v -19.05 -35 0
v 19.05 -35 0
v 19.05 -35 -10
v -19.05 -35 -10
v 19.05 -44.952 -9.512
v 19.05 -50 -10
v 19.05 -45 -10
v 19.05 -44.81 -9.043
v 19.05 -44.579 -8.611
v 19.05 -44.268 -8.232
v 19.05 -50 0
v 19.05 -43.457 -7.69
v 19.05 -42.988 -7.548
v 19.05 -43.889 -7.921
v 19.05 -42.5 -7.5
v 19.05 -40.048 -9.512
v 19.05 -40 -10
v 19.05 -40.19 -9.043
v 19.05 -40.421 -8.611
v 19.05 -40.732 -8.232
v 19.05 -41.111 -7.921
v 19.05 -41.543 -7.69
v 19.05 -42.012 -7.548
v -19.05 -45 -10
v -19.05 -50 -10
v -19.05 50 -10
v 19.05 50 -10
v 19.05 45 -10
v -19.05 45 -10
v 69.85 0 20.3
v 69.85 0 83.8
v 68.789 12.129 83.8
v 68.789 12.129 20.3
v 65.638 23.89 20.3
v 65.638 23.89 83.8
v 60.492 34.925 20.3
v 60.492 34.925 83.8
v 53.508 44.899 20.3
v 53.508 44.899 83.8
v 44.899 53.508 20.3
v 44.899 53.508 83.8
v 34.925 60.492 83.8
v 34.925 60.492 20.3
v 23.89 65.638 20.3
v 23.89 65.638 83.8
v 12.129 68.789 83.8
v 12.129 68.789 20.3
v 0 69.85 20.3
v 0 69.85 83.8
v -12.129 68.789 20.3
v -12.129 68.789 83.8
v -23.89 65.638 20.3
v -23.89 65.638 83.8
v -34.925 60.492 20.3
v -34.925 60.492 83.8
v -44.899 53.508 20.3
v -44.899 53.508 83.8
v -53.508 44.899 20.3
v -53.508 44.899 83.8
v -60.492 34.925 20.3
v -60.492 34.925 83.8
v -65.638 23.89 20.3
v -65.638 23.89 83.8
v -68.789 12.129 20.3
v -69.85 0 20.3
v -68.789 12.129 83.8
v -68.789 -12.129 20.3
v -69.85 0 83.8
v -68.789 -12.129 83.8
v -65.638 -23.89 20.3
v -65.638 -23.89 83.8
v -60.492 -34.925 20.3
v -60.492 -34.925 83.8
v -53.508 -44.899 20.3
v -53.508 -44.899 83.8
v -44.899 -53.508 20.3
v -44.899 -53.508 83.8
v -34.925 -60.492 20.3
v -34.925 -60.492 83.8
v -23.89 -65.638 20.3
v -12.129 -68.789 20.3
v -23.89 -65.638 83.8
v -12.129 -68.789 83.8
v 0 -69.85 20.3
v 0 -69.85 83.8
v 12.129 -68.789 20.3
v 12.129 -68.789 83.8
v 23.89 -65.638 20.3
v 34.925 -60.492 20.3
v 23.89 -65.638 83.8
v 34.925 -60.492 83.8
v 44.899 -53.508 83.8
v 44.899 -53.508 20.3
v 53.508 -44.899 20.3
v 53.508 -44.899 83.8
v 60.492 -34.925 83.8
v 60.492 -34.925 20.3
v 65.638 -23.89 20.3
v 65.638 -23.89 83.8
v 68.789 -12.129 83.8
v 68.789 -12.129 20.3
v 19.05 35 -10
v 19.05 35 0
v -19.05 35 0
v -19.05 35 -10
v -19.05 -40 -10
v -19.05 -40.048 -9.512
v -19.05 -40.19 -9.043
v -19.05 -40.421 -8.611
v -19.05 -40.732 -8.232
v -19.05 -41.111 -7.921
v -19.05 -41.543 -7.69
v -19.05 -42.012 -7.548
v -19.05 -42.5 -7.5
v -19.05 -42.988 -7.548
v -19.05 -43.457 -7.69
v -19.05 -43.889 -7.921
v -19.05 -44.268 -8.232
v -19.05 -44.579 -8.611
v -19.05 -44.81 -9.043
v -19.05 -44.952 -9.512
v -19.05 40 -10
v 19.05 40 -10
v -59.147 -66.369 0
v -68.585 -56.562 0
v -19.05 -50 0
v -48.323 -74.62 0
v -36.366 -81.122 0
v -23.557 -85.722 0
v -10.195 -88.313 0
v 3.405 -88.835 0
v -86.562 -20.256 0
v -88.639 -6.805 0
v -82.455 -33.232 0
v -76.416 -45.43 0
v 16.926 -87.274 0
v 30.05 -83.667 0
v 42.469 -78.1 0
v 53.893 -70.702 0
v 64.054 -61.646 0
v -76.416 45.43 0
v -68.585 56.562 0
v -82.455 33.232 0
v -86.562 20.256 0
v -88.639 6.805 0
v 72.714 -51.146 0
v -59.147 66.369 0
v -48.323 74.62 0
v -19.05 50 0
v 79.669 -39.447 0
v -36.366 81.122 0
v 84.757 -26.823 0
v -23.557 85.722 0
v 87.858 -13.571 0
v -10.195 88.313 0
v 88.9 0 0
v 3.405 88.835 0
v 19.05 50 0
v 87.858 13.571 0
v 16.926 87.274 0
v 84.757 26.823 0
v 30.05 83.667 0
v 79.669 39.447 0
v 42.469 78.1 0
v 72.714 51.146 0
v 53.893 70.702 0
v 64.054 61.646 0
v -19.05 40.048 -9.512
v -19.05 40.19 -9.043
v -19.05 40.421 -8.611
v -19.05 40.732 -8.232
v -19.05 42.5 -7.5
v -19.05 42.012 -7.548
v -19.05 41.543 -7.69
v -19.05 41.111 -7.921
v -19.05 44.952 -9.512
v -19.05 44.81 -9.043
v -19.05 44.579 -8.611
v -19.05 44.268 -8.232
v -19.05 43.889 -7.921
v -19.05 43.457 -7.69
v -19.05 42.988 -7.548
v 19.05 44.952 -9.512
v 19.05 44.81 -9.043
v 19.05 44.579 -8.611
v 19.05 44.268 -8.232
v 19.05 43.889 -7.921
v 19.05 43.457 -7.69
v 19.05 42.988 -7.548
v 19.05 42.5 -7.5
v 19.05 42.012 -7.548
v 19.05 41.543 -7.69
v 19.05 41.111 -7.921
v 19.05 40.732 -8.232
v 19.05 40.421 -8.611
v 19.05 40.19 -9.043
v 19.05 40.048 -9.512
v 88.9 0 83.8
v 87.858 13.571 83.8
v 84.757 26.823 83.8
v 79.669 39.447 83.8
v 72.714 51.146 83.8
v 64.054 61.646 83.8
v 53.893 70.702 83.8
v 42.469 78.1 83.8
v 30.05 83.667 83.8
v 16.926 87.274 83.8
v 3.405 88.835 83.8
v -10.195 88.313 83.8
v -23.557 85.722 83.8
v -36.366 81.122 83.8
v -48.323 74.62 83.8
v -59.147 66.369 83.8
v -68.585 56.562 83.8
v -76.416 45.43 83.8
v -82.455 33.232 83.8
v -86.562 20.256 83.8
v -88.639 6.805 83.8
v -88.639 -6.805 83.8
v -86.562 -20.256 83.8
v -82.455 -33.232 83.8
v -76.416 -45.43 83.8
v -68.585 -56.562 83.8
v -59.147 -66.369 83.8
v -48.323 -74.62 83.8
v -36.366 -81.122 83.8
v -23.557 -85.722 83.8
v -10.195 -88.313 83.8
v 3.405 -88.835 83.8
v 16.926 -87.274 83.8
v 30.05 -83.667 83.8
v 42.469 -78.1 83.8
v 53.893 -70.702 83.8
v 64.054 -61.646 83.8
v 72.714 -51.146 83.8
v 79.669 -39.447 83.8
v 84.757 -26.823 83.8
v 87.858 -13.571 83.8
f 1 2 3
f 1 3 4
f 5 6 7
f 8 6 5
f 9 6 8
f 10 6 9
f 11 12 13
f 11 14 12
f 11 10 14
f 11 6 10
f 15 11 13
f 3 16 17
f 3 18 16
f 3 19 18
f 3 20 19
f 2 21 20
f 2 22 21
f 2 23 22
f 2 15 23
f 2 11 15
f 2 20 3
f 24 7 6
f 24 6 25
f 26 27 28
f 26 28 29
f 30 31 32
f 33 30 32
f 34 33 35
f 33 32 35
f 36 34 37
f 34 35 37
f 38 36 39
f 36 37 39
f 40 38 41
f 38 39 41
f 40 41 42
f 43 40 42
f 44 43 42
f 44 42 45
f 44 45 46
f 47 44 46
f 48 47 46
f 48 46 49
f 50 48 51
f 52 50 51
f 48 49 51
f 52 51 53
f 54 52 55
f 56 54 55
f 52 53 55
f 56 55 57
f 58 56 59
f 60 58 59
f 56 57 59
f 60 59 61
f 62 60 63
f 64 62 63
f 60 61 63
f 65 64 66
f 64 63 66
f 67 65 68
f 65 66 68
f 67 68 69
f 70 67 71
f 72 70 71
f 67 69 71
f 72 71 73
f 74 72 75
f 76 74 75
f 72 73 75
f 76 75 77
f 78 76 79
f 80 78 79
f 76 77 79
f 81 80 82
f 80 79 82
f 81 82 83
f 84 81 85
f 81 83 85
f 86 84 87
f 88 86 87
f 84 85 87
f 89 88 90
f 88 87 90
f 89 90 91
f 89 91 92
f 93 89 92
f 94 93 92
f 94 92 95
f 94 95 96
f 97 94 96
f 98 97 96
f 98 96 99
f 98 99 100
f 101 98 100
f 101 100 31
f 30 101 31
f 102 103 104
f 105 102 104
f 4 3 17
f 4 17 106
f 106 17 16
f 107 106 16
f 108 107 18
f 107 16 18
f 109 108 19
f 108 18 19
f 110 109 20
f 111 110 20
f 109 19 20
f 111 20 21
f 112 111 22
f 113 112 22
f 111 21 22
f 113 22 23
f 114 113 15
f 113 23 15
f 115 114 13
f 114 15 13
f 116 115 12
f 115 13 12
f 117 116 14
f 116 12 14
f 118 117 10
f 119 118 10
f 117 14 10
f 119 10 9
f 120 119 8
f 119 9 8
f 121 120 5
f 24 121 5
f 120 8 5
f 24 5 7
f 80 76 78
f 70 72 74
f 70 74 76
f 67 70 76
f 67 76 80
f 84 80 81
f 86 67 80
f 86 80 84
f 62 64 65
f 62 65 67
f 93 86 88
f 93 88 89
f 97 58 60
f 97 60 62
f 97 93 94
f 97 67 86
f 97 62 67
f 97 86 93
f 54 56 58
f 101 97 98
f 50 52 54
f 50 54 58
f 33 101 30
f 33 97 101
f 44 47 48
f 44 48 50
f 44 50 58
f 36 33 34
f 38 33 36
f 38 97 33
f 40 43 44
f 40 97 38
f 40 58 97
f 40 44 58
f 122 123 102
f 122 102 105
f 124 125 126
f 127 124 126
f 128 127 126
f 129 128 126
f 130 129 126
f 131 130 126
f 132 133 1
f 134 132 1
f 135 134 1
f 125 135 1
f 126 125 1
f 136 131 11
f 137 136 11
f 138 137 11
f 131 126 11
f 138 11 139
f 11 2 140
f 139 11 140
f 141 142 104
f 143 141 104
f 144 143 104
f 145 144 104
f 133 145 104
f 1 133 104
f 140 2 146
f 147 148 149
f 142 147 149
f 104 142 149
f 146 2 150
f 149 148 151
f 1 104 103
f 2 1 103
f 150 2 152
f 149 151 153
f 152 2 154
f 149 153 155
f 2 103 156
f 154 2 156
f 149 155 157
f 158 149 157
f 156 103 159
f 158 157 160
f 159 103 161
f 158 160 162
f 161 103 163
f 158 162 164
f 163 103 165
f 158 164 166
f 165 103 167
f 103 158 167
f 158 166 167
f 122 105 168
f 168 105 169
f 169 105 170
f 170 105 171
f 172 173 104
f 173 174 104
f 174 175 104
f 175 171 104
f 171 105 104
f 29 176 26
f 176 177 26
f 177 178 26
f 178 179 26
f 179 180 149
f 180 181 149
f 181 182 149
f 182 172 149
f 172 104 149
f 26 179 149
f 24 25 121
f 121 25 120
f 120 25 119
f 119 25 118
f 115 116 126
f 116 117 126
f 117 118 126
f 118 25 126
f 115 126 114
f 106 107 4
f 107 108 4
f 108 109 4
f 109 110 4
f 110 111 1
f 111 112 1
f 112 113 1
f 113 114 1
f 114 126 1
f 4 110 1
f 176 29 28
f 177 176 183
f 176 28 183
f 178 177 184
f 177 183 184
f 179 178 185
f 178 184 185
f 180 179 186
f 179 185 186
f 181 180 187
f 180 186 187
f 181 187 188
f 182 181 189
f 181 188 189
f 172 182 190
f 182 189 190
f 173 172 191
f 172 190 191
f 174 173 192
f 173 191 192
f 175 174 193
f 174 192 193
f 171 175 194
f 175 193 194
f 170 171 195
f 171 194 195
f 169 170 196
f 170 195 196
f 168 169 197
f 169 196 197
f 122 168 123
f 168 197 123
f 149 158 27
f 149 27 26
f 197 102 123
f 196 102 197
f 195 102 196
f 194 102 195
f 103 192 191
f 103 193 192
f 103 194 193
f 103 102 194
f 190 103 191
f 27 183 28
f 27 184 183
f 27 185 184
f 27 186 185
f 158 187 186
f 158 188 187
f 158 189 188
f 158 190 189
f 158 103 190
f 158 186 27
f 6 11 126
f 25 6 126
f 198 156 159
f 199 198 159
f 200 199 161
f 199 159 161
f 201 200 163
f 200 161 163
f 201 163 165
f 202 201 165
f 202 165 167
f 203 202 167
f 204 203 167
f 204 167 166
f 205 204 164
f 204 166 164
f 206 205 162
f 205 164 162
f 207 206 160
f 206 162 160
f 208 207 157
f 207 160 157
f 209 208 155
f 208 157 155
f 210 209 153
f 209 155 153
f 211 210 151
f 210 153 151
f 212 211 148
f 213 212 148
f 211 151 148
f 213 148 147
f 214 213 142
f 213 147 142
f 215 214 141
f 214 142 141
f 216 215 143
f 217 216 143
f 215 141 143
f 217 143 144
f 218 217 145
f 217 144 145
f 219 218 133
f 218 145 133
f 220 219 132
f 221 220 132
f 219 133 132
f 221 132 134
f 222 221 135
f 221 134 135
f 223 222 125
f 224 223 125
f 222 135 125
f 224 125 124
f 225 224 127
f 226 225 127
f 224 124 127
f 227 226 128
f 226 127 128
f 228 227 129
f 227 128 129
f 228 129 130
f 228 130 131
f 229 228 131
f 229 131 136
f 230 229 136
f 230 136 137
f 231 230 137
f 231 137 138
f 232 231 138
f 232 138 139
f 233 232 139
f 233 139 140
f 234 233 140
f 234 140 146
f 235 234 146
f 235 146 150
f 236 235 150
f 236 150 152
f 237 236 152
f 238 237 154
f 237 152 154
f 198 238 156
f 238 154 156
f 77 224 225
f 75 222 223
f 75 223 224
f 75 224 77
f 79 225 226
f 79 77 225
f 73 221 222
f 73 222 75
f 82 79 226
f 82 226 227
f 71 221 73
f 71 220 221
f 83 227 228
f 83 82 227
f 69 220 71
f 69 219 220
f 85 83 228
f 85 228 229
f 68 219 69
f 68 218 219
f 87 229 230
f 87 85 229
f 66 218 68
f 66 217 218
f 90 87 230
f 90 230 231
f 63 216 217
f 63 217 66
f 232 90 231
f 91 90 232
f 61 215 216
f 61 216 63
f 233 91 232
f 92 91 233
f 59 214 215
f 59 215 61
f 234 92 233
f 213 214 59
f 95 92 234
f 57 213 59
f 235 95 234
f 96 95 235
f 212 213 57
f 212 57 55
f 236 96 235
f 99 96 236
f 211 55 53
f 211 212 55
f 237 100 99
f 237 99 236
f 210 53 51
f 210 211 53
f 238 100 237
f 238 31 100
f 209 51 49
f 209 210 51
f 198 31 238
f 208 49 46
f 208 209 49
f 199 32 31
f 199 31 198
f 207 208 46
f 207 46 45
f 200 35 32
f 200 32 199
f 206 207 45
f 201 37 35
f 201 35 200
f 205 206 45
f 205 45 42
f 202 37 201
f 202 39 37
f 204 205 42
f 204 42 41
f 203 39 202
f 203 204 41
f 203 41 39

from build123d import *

# Parameters (mm, degrees)
SKETCH1_R           = 88.9
BOSS_EXTRUDE1_DEPTH = 83.8
SKETCH2_W           = 38.1
SKETCH2_H           = 15
BOSS_EXTRUDE2_DEPTH = 10
SKETCH4_R           = 2.5
CUT_EXTRUDE1_DEPTH  = 108.95
SKETCH5_R           = 2.5
CUT_EXTRUDE2_DEPTH  = 38.1
SKETCH6_R           = 69.85
CUT_EXTRUDE3_DEPTH  = 63.5


with BuildPart() as part:
    # Sketch1 → Boss-Extrude1 (new body)
    with BuildSketch(Plane.XY):
        Circle(SKETCH1_R)
    extrude(amount=BOSS_EXTRUDE1_DEPTH)

    # Sketch2 → Boss-Extrude2 (add)
    with BuildSketch(Plane(origin=(0, 0, 0), x_dir=(-1, 0, 0), z_dir=(0, 0, -1))):
        with Locations((0, 42.5)):
            Rectangle(SKETCH2_W, SKETCH2_H)
        with Locations((0, -42.5)):
            Rectangle(SKETCH2_W, SKETCH2_H)
    extrude(amount=BOSS_EXTRUDE2_DEPTH)

    # Sketch4 → Cut-Extrude1 (cut, through all)
    with BuildSketch(Plane(origin=(19.05, 0, 0), x_dir=(0, 0, -1), z_dir=(1, 0, 0))):
        with Locations((10, 42.5)):
            Circle(SKETCH4_R)
    extrude(amount=-CUT_EXTRUDE1_DEPTH, mode=Mode.SUBTRACT)

    # Sketch5 → Cut-Extrude2 (cut)
    with BuildSketch(Plane(origin=(19.05, 0, 0), x_dir=(0, 0, -1), z_dir=(1, 0, 0))):
        with Locations((10, -42.5)):
            Circle(SKETCH5_R)
    extrude(amount=-CUT_EXTRUDE2_DEPTH, mode=Mode.SUBTRACT)

    # Sketch6 → Cut-Extrude3 (cut)
    with BuildSketch(Plane.XY.offset(83.8)):
        Circle(SKETCH6_R)
    extrude(amount=-CUT_EXTRUDE3_DEPTH, mode=Mode.SUBTRACT)


solid = part.part
